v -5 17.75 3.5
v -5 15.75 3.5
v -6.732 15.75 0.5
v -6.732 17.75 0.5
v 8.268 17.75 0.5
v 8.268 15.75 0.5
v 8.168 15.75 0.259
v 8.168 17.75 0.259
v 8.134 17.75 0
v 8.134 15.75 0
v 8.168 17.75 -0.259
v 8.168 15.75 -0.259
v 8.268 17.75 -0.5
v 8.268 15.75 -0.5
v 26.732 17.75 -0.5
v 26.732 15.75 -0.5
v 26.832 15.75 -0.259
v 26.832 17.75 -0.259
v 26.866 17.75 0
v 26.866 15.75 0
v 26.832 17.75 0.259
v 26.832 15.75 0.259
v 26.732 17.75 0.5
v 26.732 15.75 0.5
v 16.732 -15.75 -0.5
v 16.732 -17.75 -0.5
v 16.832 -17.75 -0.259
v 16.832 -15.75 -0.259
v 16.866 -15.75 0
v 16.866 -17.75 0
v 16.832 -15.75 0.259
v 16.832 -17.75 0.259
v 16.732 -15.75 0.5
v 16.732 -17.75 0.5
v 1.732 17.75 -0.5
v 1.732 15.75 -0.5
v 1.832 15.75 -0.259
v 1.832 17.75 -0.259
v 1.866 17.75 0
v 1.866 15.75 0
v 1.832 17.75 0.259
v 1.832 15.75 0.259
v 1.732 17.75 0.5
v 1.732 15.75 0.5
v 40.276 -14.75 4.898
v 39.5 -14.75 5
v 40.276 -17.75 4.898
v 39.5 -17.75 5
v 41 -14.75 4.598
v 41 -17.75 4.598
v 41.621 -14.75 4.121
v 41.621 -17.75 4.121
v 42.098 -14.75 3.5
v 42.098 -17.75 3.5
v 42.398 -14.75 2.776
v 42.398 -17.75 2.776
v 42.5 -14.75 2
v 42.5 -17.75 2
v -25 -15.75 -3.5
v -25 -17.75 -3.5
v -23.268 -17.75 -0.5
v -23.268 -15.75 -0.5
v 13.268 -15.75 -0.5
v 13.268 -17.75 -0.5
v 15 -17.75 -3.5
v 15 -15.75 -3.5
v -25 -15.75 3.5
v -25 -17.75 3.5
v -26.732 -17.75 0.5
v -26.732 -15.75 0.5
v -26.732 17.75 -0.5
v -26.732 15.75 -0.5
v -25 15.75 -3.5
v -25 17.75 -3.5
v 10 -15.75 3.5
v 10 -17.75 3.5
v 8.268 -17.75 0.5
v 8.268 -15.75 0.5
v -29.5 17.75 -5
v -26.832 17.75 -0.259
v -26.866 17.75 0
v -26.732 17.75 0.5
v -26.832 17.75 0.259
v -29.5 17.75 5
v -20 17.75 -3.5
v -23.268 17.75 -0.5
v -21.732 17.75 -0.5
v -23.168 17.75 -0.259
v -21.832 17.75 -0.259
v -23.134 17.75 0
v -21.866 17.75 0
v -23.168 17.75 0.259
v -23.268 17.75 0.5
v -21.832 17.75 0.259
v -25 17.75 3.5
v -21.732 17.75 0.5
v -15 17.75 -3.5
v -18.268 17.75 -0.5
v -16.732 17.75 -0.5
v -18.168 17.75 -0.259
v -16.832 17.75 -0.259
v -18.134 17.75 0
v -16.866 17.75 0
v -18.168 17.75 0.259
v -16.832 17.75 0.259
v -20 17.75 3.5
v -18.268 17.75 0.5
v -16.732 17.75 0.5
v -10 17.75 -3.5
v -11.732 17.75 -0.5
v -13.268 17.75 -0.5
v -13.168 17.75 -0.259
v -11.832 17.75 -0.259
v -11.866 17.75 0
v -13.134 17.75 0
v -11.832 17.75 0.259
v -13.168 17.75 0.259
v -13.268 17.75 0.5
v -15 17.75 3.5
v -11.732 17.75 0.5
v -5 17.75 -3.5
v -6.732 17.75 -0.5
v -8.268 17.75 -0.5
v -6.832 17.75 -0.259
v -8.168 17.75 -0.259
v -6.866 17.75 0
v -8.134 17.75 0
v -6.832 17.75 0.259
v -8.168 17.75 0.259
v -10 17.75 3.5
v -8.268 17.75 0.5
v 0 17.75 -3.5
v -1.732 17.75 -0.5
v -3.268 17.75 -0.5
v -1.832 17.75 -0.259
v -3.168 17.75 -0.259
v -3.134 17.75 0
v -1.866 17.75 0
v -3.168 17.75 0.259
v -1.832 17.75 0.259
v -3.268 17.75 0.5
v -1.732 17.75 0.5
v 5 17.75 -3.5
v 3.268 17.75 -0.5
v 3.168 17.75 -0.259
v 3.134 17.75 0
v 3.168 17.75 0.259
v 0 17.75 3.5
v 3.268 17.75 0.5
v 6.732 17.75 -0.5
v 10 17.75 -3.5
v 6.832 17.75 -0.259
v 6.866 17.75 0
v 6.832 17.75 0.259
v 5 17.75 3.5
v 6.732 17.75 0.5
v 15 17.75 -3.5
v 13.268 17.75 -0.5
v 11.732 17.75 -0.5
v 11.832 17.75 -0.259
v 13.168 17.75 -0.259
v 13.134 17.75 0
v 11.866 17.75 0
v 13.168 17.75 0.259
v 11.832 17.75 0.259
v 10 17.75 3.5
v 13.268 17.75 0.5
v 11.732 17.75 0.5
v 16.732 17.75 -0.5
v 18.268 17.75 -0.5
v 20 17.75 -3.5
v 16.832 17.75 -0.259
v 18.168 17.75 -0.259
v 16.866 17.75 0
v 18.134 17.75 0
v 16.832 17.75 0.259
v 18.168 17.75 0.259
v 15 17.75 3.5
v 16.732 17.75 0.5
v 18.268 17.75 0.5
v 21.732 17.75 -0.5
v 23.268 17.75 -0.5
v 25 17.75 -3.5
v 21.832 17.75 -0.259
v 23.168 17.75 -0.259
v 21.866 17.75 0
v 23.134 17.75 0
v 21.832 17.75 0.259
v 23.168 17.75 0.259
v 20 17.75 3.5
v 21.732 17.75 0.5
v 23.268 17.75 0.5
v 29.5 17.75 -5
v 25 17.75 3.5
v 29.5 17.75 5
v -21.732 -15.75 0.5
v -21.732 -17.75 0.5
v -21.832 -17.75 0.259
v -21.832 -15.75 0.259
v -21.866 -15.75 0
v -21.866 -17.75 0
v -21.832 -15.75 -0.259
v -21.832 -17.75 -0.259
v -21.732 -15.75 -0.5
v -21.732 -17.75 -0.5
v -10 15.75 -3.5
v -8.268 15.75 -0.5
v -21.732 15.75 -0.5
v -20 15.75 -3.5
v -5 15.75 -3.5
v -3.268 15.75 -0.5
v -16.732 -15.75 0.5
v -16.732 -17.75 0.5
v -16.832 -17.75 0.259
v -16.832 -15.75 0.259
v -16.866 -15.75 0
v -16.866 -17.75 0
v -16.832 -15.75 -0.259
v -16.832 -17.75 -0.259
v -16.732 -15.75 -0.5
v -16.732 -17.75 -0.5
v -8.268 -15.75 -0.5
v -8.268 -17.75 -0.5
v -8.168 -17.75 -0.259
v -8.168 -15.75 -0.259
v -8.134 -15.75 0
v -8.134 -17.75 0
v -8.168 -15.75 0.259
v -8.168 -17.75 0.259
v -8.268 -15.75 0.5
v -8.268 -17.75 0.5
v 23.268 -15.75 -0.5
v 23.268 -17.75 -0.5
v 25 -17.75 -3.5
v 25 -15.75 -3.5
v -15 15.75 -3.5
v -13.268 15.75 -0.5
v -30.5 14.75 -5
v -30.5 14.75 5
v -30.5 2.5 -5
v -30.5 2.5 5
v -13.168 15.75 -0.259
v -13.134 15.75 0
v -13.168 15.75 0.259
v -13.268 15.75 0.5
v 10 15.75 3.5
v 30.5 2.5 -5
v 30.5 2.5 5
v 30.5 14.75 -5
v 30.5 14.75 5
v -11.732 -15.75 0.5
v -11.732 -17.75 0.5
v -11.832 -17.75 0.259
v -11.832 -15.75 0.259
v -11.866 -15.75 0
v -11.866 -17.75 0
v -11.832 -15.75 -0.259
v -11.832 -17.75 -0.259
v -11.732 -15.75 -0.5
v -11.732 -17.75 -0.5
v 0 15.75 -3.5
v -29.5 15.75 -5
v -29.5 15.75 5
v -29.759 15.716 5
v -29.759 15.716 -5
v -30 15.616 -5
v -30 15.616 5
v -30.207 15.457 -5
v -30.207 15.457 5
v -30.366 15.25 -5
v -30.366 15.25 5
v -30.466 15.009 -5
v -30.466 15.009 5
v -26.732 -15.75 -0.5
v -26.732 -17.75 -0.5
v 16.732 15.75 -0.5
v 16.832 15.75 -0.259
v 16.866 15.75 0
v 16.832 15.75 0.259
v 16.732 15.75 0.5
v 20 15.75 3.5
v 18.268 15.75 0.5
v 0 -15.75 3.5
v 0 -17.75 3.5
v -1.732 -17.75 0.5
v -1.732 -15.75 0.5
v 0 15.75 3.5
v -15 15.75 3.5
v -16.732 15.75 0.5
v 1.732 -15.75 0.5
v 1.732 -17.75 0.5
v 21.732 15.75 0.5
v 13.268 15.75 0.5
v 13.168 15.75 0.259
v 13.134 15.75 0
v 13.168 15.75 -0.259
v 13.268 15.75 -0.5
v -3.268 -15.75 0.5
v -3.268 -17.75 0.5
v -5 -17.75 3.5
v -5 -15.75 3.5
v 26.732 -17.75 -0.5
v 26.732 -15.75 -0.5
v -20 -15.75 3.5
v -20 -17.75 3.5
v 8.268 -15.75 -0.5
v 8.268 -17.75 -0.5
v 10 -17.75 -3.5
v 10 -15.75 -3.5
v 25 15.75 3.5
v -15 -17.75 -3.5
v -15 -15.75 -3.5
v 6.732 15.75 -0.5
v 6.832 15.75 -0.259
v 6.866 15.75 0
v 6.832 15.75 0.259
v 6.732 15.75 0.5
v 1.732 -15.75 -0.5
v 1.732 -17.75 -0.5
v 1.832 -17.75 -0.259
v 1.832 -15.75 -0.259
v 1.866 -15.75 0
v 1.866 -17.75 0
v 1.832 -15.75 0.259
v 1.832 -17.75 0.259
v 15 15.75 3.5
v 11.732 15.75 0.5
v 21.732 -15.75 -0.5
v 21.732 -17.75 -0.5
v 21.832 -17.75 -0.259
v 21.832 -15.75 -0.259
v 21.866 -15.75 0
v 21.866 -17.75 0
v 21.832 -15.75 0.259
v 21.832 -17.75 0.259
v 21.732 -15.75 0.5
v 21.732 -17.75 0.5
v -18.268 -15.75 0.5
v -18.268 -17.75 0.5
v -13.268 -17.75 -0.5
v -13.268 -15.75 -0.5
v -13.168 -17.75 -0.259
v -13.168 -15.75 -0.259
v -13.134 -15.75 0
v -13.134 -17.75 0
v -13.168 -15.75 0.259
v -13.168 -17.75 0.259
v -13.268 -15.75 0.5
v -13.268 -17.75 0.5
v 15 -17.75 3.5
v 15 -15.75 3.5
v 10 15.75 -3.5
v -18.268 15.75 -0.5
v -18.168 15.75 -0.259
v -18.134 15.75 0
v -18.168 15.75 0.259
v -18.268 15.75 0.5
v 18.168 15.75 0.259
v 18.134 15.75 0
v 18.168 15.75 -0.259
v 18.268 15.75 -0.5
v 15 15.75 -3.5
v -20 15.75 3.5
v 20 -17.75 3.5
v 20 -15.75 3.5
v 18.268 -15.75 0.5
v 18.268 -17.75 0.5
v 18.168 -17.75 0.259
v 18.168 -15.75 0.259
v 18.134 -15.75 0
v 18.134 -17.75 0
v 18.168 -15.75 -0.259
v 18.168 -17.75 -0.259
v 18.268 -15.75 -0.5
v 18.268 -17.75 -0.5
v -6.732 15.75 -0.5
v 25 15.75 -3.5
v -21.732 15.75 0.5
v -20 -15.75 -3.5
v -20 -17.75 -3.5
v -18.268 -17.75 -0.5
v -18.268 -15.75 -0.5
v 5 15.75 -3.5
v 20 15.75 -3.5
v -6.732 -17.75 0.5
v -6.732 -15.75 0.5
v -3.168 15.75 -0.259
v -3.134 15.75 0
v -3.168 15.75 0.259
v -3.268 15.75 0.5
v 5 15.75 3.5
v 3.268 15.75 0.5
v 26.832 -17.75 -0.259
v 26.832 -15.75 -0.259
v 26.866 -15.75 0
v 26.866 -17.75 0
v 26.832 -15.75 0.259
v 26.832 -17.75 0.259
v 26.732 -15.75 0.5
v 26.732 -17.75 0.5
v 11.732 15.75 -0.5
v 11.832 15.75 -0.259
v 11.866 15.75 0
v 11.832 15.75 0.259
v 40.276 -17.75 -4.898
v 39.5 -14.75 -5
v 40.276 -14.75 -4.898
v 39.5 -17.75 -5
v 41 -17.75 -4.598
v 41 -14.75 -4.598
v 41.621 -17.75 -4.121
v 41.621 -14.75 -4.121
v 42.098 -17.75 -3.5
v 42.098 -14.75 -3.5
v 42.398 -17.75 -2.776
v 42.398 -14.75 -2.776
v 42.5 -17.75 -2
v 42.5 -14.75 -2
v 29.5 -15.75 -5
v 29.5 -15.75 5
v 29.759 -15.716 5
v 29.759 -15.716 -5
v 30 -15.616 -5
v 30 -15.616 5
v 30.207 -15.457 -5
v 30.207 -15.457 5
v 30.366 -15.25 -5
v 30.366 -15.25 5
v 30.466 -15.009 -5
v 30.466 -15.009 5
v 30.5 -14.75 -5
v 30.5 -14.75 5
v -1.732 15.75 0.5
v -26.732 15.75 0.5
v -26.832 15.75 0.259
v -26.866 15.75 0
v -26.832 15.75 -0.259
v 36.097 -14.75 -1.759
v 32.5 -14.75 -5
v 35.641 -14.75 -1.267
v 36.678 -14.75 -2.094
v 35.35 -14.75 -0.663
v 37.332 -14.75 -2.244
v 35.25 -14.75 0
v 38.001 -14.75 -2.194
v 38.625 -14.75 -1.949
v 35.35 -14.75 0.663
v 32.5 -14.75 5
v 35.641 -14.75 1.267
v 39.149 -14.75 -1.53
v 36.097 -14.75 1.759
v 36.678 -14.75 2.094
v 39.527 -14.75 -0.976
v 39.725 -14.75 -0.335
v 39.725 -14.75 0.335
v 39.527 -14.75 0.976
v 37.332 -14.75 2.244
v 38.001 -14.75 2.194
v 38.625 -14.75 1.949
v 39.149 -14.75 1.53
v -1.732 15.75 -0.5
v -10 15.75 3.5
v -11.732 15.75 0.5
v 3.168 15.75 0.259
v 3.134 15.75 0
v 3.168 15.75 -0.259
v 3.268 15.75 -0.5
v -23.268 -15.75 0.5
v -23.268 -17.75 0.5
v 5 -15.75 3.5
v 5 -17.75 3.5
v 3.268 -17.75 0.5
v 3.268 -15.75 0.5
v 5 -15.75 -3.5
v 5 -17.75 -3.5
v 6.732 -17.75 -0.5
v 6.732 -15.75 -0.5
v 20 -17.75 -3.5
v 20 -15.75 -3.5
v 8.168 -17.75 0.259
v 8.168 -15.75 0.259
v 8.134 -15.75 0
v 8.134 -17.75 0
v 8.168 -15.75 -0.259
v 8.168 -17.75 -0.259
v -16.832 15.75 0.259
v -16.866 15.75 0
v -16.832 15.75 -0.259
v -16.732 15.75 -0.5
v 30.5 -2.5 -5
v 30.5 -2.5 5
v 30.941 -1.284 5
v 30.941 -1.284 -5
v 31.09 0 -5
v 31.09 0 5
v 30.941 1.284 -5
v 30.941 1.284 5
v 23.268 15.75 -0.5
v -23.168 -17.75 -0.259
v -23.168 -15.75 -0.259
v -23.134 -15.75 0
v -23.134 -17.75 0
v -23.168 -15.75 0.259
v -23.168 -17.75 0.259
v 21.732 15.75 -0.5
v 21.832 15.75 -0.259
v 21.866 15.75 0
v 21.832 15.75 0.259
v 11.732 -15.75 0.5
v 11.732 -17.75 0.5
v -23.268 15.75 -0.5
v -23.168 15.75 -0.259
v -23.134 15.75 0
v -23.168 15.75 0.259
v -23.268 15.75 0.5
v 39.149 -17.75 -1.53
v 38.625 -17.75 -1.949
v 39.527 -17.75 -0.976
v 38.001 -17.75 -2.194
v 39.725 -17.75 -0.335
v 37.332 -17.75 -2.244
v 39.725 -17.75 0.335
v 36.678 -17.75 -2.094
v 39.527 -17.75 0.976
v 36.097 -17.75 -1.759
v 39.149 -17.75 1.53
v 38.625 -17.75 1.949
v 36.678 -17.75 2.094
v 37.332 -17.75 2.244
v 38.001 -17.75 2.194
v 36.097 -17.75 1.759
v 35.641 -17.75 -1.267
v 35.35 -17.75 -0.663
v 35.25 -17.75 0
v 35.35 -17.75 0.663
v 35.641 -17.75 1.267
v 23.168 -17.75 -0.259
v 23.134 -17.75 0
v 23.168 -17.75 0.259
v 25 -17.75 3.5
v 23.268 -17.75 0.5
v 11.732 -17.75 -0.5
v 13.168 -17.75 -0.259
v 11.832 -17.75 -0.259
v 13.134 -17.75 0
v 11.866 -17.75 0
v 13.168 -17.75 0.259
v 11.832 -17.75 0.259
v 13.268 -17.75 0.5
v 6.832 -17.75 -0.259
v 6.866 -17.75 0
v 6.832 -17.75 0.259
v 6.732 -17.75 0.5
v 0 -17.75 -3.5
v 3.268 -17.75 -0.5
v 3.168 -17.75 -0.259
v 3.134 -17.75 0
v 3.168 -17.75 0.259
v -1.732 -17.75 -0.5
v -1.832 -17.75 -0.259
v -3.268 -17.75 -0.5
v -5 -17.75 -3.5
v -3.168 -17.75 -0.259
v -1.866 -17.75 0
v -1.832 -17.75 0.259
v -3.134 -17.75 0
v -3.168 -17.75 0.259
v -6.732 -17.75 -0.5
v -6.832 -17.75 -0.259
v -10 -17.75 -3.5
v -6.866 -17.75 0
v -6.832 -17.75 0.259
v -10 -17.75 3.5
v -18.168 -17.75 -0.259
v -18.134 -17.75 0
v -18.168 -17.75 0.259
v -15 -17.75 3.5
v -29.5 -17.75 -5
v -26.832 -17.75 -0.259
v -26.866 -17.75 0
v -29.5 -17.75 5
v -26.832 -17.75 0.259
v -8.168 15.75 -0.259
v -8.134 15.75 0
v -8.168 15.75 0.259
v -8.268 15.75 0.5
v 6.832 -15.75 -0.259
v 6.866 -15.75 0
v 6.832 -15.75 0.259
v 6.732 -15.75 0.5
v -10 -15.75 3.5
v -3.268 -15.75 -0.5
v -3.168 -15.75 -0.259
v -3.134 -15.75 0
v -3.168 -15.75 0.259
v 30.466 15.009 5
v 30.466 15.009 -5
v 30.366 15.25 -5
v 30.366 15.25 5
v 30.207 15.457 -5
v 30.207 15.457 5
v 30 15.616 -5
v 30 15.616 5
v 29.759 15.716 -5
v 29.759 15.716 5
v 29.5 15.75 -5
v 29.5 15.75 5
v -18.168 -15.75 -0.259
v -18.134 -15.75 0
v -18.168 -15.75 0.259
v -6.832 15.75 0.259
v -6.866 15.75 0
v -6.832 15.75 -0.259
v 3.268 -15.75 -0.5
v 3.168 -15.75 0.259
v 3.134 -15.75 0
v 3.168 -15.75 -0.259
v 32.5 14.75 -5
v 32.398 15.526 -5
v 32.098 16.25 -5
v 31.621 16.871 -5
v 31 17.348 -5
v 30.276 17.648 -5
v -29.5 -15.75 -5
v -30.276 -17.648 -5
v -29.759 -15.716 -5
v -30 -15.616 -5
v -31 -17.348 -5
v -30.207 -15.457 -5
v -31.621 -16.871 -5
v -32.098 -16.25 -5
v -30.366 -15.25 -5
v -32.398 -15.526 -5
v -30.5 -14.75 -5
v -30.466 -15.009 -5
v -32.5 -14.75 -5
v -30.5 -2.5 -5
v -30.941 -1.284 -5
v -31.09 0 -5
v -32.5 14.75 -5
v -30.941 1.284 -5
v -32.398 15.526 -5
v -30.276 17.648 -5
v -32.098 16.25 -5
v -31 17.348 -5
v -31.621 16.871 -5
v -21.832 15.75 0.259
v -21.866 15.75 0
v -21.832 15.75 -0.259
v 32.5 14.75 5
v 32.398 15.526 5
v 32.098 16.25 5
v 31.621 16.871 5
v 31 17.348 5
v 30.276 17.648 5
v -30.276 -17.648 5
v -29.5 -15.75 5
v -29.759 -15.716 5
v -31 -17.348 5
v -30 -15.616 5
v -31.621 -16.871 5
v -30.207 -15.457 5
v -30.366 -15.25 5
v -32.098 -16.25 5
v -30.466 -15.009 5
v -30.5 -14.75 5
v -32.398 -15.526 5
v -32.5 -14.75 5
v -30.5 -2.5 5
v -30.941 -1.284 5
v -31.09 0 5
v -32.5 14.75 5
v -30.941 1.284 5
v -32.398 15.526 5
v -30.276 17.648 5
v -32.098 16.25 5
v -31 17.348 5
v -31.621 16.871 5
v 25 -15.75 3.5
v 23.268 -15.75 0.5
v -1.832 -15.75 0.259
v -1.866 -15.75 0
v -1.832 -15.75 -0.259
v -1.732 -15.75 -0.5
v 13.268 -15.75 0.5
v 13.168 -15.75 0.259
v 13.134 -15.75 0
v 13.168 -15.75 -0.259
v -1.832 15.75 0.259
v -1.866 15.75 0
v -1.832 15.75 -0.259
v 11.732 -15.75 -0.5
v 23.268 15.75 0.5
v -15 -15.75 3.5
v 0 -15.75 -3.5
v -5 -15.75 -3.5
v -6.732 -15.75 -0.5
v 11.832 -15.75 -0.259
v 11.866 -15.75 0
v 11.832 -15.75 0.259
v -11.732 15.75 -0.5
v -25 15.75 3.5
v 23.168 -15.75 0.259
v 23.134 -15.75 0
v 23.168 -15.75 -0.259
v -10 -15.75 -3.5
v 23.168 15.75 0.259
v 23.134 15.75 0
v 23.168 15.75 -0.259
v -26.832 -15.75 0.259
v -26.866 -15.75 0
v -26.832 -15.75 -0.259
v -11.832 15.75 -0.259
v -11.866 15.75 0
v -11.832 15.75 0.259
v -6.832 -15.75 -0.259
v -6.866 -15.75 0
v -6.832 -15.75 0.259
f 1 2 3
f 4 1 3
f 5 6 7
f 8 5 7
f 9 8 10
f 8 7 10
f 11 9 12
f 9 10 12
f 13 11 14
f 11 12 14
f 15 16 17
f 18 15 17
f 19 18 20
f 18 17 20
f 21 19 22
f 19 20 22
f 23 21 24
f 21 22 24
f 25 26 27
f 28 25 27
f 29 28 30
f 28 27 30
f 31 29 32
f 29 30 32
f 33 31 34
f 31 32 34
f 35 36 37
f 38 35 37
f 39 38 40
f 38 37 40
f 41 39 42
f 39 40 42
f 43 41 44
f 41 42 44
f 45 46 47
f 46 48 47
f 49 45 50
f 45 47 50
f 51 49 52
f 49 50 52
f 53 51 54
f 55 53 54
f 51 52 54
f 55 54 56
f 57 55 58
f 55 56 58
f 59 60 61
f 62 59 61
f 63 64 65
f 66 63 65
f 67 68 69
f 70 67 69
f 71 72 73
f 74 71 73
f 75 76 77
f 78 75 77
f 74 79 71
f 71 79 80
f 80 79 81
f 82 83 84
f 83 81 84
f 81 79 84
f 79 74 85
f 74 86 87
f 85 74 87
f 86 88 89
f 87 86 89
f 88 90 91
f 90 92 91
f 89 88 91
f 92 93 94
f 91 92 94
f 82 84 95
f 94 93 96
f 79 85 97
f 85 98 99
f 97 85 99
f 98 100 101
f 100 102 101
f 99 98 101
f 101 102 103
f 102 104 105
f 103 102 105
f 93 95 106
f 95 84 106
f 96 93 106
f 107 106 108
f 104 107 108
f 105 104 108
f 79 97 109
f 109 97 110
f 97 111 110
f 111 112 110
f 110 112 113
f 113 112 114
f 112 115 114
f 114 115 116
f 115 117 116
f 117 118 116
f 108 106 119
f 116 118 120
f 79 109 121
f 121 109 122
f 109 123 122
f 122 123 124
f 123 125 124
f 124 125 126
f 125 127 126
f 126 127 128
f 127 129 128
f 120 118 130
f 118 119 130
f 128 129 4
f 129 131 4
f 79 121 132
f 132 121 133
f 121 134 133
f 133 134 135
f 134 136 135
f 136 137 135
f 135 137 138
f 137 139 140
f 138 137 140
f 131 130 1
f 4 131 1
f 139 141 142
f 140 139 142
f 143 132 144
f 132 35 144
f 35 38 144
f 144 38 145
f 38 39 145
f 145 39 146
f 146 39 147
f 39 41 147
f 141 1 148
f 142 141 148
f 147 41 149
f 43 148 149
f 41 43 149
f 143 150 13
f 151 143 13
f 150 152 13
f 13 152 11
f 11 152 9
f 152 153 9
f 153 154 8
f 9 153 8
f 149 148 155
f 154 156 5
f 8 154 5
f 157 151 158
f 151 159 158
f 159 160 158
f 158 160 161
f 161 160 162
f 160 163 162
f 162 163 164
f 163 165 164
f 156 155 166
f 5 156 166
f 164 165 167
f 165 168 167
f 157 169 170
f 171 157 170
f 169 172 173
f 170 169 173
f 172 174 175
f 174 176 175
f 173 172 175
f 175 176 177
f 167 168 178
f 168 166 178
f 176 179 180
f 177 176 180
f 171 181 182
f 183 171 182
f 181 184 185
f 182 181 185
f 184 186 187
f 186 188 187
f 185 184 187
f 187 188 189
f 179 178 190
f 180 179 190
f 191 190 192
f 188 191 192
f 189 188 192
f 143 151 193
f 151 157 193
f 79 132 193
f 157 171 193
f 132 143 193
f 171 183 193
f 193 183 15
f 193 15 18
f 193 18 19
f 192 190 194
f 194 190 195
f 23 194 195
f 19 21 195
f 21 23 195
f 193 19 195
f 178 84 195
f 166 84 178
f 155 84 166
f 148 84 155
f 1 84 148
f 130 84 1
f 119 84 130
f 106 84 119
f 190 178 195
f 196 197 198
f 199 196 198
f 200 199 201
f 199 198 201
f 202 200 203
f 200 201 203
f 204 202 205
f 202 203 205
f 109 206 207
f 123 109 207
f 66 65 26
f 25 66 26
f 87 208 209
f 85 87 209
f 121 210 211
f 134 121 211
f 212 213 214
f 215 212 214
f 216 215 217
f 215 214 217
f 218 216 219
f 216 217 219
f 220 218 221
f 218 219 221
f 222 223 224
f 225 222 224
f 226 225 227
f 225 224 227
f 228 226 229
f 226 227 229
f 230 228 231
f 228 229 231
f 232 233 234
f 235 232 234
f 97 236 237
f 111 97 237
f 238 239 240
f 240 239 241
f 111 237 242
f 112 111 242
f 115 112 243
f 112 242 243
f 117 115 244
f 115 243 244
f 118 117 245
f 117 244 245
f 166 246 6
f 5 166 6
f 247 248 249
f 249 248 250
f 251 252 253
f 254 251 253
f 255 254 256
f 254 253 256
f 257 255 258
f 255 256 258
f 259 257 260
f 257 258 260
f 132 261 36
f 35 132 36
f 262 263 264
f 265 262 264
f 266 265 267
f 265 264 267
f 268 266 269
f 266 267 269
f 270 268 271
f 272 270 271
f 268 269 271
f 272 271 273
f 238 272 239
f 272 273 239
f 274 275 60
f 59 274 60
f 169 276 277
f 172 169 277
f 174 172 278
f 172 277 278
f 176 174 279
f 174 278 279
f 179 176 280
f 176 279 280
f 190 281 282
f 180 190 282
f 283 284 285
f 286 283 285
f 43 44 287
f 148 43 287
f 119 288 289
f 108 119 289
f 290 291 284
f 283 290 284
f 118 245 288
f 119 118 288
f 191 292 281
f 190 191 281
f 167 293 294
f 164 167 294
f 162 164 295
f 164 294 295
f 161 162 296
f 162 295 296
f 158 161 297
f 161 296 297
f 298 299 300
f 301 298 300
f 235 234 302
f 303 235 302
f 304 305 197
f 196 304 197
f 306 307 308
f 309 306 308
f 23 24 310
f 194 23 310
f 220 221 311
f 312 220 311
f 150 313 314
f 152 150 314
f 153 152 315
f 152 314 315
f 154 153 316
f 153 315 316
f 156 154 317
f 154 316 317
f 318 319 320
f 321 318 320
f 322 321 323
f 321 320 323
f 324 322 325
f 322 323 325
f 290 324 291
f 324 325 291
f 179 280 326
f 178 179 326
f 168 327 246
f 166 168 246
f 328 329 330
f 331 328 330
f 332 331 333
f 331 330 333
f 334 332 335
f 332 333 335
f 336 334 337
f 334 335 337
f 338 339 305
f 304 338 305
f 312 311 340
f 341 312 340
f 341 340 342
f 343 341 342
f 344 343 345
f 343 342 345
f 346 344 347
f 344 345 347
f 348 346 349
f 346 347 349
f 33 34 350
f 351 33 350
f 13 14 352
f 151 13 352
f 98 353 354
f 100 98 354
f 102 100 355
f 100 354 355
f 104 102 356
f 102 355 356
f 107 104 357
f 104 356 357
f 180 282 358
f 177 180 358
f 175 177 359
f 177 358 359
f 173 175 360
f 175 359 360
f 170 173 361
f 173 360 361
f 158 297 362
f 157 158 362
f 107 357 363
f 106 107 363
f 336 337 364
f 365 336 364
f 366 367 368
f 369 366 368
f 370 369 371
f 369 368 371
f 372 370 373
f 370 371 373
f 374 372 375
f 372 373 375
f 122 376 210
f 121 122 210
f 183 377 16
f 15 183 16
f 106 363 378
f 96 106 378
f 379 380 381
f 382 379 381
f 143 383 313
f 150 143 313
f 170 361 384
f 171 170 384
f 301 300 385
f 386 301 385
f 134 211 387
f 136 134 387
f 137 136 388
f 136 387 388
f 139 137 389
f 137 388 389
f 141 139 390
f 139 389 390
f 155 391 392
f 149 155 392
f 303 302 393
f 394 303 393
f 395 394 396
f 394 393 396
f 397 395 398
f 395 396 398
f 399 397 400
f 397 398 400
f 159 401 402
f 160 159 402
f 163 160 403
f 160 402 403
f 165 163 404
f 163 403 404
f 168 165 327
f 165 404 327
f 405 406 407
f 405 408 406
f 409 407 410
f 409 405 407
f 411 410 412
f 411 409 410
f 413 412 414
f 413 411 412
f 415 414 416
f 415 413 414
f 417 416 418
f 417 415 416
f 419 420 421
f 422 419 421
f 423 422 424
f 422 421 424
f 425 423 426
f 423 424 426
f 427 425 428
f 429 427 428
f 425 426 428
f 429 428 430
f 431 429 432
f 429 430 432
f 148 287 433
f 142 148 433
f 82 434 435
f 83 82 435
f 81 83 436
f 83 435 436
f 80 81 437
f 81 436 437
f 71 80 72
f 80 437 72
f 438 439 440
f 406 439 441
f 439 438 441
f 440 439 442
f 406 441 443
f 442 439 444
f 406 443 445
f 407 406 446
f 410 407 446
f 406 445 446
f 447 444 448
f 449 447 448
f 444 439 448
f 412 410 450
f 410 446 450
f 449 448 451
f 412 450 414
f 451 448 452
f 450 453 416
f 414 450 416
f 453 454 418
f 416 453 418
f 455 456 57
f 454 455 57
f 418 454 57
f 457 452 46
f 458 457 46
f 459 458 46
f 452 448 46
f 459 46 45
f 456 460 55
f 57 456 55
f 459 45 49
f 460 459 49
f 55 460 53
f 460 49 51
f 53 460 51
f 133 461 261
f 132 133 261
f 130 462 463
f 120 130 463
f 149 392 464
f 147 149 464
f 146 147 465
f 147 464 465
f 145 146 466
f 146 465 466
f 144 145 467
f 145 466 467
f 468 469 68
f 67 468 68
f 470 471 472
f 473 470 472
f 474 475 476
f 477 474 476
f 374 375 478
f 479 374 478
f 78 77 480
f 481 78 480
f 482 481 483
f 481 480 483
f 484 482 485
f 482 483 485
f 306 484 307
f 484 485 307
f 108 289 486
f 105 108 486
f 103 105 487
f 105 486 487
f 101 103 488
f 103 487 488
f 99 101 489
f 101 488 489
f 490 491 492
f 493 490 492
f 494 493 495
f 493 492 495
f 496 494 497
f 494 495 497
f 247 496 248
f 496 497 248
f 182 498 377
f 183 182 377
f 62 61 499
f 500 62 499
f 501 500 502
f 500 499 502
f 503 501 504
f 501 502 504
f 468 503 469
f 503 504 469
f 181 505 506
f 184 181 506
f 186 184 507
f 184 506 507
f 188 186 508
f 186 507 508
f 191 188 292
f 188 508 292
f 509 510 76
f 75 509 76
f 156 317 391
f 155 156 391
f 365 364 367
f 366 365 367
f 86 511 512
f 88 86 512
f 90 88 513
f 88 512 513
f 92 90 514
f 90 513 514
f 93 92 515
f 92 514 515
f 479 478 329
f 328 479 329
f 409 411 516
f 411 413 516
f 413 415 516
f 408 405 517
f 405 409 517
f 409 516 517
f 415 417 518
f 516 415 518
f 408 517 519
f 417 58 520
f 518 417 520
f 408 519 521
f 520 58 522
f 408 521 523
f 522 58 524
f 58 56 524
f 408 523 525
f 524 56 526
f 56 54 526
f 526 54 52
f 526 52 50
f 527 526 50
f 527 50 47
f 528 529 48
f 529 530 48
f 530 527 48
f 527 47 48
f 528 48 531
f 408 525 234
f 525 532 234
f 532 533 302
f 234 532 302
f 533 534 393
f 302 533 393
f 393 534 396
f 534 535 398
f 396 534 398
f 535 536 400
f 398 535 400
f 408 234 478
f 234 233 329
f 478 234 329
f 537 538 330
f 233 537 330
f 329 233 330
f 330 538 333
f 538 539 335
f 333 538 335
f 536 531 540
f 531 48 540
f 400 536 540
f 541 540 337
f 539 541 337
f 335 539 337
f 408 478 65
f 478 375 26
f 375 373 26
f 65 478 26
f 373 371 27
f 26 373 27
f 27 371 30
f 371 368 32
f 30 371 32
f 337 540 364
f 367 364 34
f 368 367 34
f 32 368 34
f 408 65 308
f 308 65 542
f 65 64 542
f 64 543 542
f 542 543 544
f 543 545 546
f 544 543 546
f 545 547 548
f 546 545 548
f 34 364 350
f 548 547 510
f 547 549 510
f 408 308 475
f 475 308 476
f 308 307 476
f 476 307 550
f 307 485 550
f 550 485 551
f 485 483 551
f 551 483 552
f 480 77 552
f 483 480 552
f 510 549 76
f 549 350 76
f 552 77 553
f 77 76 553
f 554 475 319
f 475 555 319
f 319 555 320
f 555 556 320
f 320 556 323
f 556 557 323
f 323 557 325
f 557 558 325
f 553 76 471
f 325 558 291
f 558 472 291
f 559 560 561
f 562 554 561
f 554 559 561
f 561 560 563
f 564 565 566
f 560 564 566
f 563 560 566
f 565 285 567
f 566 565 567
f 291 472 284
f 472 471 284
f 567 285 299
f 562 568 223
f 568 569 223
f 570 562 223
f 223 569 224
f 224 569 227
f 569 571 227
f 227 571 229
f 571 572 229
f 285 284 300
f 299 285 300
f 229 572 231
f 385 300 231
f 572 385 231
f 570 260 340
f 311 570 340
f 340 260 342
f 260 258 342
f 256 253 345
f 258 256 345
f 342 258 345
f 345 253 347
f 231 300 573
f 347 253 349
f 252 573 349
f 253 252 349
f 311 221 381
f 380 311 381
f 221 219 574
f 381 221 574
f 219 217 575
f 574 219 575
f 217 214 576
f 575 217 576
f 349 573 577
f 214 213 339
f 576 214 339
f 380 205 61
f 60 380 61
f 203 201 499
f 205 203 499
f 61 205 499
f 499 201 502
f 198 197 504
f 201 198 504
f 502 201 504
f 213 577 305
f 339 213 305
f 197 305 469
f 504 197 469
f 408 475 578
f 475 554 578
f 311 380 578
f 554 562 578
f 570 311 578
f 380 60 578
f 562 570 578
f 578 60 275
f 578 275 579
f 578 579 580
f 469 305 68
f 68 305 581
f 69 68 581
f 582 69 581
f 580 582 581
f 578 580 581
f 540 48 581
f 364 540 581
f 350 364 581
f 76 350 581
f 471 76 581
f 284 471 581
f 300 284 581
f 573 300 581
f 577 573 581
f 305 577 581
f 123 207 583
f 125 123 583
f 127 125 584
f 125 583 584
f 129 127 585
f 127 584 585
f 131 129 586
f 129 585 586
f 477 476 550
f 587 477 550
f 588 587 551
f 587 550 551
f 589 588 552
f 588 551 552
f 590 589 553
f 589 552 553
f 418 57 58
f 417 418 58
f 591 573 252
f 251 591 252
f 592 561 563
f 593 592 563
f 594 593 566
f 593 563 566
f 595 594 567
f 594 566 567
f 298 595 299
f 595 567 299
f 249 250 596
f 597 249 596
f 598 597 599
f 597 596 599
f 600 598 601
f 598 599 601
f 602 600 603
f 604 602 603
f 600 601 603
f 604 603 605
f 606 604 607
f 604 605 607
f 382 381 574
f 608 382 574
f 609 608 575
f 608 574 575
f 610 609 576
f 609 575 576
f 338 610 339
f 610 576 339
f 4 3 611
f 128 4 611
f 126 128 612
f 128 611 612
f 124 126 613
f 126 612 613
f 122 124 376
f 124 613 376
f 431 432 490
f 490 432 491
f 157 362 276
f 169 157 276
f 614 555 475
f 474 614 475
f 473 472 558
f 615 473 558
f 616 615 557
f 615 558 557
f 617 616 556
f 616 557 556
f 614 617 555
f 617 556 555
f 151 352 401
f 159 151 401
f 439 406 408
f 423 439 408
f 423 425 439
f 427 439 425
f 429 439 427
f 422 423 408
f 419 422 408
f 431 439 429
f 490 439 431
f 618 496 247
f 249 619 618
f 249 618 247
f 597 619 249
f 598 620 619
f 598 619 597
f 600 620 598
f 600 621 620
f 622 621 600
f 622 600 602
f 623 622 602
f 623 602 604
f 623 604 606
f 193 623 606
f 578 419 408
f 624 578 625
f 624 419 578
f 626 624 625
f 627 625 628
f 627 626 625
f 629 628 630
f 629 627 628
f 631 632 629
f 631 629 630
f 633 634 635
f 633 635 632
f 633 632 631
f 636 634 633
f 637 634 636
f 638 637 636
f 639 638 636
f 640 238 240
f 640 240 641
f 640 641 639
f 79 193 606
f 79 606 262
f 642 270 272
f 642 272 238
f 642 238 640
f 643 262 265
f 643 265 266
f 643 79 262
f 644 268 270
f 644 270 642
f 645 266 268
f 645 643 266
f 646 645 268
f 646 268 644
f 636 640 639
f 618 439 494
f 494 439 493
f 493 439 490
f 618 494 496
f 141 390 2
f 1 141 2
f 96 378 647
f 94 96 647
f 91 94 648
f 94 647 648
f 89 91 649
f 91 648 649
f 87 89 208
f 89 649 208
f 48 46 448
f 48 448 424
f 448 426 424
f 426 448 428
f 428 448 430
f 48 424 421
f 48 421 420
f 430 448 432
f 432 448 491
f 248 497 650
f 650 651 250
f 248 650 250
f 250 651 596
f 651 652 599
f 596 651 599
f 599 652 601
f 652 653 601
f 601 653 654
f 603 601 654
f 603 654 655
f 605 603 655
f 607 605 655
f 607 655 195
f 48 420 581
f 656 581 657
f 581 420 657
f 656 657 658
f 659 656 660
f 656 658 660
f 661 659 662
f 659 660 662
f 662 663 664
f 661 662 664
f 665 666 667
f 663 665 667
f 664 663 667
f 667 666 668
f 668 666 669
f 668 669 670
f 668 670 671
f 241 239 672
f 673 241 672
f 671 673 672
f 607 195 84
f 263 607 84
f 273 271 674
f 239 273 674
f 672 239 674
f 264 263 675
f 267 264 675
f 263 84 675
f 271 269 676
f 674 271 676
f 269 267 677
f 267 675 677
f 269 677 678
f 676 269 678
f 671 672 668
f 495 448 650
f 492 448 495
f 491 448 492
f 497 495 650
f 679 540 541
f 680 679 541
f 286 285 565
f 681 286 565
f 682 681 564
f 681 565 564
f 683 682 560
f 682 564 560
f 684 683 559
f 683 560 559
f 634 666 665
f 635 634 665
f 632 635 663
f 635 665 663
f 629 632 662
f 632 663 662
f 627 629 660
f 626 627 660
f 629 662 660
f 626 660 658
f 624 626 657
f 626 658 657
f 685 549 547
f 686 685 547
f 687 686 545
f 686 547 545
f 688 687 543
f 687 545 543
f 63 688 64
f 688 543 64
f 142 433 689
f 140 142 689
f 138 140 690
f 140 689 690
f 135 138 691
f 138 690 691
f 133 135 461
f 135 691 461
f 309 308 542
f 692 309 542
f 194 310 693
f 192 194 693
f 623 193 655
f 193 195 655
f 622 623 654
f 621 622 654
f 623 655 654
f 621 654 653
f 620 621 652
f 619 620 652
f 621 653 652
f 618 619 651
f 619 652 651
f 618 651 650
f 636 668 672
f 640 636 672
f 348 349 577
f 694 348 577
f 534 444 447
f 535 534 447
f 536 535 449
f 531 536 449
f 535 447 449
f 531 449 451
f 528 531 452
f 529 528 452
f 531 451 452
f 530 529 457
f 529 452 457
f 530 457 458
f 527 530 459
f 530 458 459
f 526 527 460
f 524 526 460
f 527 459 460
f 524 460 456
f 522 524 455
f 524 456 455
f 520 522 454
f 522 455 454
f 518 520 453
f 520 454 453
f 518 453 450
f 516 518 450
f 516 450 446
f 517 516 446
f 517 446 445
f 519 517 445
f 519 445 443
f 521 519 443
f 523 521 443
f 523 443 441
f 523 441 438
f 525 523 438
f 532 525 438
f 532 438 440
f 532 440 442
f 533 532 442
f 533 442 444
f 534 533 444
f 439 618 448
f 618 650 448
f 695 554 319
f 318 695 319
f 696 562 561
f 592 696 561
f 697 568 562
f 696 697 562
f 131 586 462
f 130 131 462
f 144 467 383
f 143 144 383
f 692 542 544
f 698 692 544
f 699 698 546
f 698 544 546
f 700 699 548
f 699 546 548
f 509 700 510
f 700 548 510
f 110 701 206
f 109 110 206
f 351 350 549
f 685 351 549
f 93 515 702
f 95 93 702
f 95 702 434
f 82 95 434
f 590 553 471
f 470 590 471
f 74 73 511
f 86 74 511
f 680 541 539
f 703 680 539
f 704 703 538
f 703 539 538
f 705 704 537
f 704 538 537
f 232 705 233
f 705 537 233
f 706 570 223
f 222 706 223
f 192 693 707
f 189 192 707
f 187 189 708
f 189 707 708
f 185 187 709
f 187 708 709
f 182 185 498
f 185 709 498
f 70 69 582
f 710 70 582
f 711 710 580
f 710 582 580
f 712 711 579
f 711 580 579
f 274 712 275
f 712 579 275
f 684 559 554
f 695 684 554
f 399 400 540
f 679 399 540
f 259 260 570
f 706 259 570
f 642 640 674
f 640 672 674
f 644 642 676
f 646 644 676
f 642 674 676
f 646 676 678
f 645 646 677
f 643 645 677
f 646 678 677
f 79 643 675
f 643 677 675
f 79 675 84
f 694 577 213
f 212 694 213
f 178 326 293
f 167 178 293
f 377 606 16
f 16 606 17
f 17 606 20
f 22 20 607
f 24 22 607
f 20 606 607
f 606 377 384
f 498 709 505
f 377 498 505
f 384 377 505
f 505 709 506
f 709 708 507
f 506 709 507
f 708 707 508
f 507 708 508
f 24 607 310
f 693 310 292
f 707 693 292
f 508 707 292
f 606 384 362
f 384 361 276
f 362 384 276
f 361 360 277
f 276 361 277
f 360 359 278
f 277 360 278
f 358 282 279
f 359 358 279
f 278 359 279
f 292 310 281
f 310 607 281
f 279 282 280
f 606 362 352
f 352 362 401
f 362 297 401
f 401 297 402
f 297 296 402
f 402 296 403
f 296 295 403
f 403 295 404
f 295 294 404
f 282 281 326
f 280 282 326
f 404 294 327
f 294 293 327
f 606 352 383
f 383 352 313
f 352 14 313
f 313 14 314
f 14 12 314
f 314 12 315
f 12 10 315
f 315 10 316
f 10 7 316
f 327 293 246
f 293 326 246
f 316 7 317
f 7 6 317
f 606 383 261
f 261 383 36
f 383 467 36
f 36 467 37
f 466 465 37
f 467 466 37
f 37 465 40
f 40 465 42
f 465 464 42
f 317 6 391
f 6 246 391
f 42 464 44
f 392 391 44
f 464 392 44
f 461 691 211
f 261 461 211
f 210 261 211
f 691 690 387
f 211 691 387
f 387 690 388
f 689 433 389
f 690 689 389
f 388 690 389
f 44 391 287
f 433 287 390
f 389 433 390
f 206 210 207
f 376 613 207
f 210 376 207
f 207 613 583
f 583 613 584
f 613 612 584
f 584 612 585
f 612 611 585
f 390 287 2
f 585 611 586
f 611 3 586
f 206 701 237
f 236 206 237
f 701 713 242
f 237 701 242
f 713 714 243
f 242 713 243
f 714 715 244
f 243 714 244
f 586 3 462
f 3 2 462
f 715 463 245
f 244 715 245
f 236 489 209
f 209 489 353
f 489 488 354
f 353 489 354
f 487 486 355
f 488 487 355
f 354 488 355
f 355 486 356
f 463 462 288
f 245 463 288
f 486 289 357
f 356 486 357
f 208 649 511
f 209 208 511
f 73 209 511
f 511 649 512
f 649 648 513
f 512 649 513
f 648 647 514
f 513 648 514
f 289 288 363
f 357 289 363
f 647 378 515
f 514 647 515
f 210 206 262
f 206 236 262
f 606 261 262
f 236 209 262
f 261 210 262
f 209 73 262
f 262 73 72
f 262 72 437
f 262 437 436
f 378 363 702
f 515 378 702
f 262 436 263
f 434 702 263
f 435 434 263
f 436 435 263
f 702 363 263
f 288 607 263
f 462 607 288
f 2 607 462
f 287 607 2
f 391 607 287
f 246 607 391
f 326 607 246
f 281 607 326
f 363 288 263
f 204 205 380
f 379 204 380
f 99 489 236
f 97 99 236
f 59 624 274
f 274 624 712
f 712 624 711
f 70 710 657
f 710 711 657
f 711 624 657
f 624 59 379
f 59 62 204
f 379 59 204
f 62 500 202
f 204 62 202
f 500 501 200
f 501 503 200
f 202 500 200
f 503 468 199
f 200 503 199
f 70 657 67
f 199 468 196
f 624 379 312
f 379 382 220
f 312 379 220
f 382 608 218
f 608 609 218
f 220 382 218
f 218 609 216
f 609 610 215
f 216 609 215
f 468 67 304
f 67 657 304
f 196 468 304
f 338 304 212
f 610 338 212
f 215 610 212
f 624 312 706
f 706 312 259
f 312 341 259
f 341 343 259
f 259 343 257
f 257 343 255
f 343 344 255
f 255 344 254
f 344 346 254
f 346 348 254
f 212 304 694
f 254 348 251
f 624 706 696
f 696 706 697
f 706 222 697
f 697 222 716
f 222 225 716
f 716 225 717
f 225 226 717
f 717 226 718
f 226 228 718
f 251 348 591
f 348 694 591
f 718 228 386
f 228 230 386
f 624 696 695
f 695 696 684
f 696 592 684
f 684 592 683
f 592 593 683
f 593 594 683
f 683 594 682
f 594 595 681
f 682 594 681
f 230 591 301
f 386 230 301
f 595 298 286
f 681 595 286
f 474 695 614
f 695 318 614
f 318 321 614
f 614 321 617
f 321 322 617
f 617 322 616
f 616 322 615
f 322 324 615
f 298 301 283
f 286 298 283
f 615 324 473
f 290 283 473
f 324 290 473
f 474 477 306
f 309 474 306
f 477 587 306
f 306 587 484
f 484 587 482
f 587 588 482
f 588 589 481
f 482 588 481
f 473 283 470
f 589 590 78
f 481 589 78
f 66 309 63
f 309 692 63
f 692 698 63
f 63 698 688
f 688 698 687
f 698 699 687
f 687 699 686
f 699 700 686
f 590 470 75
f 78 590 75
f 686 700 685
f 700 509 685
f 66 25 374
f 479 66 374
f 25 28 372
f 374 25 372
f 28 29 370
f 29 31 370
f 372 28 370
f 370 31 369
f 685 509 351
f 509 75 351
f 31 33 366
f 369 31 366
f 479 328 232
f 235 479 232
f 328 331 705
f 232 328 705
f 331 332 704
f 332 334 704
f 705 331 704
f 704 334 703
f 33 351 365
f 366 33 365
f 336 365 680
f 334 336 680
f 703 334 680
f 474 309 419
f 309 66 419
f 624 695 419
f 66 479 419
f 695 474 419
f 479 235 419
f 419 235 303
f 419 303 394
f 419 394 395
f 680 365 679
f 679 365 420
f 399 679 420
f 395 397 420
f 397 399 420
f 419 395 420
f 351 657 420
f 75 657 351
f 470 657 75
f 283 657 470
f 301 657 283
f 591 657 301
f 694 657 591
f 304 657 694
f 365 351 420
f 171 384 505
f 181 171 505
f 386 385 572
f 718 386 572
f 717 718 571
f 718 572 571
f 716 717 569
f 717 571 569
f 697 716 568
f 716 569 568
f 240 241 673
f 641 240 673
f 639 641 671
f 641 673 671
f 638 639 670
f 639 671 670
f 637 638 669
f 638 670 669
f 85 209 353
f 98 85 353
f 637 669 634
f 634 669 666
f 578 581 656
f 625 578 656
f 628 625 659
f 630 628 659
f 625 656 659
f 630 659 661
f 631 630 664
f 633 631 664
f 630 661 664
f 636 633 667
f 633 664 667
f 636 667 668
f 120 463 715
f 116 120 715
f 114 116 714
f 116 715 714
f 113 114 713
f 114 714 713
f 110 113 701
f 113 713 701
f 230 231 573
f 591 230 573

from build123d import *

# Parameters (mm, degrees)
BOSS_EXTRUDE1_DEPTH = 5
SKETCH2_R           = 2.25
CUT_EXTRUDE1_DEPTH  = 54.735463151
FILLET1_R           = 3
CUT_EXTRUDE2_DEPTH  = 56.601258979
LPATTERN1_COUNT     = 6
LPATTERN1_PITCH     = 5
LPATTERN1_COL_COUNT = 6
LPATTERN1_COL_PITCH = 5


with BuildPart() as part:
    # Sketch1 → Boss-Extrude1 (new, symmetric)
    with BuildSketch(Plane.XY):
        with BuildLine():
            Line((-32.5, -14.75), (-32.5, 14.75))
            ThreePointArc((-32.5, 14.75), (-31.621320344, 16.871320344), (-29.5, 17.75))
            Line((-29.5, 17.75), (29.5, 17.75))
            ThreePointArc((29.5, 17.75), (31.621320344, 16.871320344), (32.5, 14.75))
            Line((32.5, 14.75), (32.5, -14.75))
            Line((32.5, -14.75), (42.5, -14.75))
            Line((42.5, -14.75), (42.5, -17.75))
            Line((42.5, -17.75), (29.5, -17.75))
            Line((29.5, -17.75), (-29.5, -17.75))
            ThreePointArc((-29.5, -17.75), (-31.621320344, -16.871320344), (-32.5, -14.75))
        make_face()
        with BuildLine():
            Line((-29.5, -15.75), (29.5, -15.75))
            ThreePointArc((29.5, -15.75), (30.207106781, -15.457106781), (30.5, -14.75))
            Line((30.5, -14.75), (30.5, -2.5))
            ThreePointArc((30.5, -2.5), (31.090169944, 0), (30.5, 2.5))
            Line((30.5, 2.5), (30.5, 14.75))
            ThreePointArc((30.5, 14.75), (30.207106781, 15.457106781), (29.5, 15.75))
            Line((29.5, 15.75), (-29.5, 15.75))
            ThreePointArc((-29.5, 15.75), (-30.207106781, 15.457106781), (-30.5, 14.75))
            Line((-30.5, 14.75), (-30.5, 2.5))
            ThreePointArc((-30.5, 2.5), (-31.090169944, 0), (-30.5, -2.5))
            Line((-30.5, -2.5), (-30.5, -14.75))
            ThreePointArc((-30.5, -14.75), (-30.207106781, -15.457106781), (-29.5, -15.75))
        make_face(mode=Mode.SUBTRACT)
    extrude(amount=BOSS_EXTRUDE1_DEPTH, both=True)

    # Sketch2 → Cut-Extrude1 (cut, through all)
    with BuildSketch(Plane(origin=(0, -14.75, 0), x_dir=(1, 0, 0), z_dir=(0, 1, 0))):
        with Locations(Location((37.5, 0, 0), (0, 0, 180))):
            Circle(SKETCH2_R)
    extrude(amount=-CUT_EXTRUDE1_DEPTH, mode=Mode.SUBTRACT)

    # Fillet1
    fillet1_edges = [part.edges().sort_by_distance(p)[0] for p in [
        (42.5, -16.25, -5),
        (42.5, -16.25, 5),
    ]]
    fillet(fillet1_edges, radius=FILLET1_R)

    # Sketch3 → Cut-Extrude2 (cut, through all)
    with BuildSketch(Plane.XZ.offset(17.75)):
        with BuildLine():
            Line((0, -3.5), (1.732050808, -0.5))
            ThreePointArc((1.732050808, -0.5), (1.866025404, 0), (1.732050808, 0.5))
            Line((1.732050808, 0.5), (0, 3.5))
            Line((0, 3.5), (-1.732050808, 0.5))
            ThreePointArc((-1.732050808, 0.5), (-1.866025404, 0), (-1.732050808, -0.5))
            Line((-1.732050808, -0.5), (0, -3.5))
        make_face()
    cut_extrude2 = extrude(amount=-CUT_EXTRUDE2_DEPTH, mode=Mode.SUBTRACT)

    # LPattern1: Cut-Extrude2 ×6
    with Locations(*[(-i * LPATTERN1_PITCH, 0, 0) for i in range(1, LPATTERN1_COUNT)]):
        add(cut_extrude2, mode=Mode.SUBTRACT)

    # LPattern1 col: Cut-Extrude2 ×6
    with Locations(*[(i * LPATTERN1_COL_PITCH, 0, 0) for i in range(1, LPATTERN1_COL_COUNT)]):
        add(cut_extrude2, mode=Mode.SUBTRACT)


solid = part.part
